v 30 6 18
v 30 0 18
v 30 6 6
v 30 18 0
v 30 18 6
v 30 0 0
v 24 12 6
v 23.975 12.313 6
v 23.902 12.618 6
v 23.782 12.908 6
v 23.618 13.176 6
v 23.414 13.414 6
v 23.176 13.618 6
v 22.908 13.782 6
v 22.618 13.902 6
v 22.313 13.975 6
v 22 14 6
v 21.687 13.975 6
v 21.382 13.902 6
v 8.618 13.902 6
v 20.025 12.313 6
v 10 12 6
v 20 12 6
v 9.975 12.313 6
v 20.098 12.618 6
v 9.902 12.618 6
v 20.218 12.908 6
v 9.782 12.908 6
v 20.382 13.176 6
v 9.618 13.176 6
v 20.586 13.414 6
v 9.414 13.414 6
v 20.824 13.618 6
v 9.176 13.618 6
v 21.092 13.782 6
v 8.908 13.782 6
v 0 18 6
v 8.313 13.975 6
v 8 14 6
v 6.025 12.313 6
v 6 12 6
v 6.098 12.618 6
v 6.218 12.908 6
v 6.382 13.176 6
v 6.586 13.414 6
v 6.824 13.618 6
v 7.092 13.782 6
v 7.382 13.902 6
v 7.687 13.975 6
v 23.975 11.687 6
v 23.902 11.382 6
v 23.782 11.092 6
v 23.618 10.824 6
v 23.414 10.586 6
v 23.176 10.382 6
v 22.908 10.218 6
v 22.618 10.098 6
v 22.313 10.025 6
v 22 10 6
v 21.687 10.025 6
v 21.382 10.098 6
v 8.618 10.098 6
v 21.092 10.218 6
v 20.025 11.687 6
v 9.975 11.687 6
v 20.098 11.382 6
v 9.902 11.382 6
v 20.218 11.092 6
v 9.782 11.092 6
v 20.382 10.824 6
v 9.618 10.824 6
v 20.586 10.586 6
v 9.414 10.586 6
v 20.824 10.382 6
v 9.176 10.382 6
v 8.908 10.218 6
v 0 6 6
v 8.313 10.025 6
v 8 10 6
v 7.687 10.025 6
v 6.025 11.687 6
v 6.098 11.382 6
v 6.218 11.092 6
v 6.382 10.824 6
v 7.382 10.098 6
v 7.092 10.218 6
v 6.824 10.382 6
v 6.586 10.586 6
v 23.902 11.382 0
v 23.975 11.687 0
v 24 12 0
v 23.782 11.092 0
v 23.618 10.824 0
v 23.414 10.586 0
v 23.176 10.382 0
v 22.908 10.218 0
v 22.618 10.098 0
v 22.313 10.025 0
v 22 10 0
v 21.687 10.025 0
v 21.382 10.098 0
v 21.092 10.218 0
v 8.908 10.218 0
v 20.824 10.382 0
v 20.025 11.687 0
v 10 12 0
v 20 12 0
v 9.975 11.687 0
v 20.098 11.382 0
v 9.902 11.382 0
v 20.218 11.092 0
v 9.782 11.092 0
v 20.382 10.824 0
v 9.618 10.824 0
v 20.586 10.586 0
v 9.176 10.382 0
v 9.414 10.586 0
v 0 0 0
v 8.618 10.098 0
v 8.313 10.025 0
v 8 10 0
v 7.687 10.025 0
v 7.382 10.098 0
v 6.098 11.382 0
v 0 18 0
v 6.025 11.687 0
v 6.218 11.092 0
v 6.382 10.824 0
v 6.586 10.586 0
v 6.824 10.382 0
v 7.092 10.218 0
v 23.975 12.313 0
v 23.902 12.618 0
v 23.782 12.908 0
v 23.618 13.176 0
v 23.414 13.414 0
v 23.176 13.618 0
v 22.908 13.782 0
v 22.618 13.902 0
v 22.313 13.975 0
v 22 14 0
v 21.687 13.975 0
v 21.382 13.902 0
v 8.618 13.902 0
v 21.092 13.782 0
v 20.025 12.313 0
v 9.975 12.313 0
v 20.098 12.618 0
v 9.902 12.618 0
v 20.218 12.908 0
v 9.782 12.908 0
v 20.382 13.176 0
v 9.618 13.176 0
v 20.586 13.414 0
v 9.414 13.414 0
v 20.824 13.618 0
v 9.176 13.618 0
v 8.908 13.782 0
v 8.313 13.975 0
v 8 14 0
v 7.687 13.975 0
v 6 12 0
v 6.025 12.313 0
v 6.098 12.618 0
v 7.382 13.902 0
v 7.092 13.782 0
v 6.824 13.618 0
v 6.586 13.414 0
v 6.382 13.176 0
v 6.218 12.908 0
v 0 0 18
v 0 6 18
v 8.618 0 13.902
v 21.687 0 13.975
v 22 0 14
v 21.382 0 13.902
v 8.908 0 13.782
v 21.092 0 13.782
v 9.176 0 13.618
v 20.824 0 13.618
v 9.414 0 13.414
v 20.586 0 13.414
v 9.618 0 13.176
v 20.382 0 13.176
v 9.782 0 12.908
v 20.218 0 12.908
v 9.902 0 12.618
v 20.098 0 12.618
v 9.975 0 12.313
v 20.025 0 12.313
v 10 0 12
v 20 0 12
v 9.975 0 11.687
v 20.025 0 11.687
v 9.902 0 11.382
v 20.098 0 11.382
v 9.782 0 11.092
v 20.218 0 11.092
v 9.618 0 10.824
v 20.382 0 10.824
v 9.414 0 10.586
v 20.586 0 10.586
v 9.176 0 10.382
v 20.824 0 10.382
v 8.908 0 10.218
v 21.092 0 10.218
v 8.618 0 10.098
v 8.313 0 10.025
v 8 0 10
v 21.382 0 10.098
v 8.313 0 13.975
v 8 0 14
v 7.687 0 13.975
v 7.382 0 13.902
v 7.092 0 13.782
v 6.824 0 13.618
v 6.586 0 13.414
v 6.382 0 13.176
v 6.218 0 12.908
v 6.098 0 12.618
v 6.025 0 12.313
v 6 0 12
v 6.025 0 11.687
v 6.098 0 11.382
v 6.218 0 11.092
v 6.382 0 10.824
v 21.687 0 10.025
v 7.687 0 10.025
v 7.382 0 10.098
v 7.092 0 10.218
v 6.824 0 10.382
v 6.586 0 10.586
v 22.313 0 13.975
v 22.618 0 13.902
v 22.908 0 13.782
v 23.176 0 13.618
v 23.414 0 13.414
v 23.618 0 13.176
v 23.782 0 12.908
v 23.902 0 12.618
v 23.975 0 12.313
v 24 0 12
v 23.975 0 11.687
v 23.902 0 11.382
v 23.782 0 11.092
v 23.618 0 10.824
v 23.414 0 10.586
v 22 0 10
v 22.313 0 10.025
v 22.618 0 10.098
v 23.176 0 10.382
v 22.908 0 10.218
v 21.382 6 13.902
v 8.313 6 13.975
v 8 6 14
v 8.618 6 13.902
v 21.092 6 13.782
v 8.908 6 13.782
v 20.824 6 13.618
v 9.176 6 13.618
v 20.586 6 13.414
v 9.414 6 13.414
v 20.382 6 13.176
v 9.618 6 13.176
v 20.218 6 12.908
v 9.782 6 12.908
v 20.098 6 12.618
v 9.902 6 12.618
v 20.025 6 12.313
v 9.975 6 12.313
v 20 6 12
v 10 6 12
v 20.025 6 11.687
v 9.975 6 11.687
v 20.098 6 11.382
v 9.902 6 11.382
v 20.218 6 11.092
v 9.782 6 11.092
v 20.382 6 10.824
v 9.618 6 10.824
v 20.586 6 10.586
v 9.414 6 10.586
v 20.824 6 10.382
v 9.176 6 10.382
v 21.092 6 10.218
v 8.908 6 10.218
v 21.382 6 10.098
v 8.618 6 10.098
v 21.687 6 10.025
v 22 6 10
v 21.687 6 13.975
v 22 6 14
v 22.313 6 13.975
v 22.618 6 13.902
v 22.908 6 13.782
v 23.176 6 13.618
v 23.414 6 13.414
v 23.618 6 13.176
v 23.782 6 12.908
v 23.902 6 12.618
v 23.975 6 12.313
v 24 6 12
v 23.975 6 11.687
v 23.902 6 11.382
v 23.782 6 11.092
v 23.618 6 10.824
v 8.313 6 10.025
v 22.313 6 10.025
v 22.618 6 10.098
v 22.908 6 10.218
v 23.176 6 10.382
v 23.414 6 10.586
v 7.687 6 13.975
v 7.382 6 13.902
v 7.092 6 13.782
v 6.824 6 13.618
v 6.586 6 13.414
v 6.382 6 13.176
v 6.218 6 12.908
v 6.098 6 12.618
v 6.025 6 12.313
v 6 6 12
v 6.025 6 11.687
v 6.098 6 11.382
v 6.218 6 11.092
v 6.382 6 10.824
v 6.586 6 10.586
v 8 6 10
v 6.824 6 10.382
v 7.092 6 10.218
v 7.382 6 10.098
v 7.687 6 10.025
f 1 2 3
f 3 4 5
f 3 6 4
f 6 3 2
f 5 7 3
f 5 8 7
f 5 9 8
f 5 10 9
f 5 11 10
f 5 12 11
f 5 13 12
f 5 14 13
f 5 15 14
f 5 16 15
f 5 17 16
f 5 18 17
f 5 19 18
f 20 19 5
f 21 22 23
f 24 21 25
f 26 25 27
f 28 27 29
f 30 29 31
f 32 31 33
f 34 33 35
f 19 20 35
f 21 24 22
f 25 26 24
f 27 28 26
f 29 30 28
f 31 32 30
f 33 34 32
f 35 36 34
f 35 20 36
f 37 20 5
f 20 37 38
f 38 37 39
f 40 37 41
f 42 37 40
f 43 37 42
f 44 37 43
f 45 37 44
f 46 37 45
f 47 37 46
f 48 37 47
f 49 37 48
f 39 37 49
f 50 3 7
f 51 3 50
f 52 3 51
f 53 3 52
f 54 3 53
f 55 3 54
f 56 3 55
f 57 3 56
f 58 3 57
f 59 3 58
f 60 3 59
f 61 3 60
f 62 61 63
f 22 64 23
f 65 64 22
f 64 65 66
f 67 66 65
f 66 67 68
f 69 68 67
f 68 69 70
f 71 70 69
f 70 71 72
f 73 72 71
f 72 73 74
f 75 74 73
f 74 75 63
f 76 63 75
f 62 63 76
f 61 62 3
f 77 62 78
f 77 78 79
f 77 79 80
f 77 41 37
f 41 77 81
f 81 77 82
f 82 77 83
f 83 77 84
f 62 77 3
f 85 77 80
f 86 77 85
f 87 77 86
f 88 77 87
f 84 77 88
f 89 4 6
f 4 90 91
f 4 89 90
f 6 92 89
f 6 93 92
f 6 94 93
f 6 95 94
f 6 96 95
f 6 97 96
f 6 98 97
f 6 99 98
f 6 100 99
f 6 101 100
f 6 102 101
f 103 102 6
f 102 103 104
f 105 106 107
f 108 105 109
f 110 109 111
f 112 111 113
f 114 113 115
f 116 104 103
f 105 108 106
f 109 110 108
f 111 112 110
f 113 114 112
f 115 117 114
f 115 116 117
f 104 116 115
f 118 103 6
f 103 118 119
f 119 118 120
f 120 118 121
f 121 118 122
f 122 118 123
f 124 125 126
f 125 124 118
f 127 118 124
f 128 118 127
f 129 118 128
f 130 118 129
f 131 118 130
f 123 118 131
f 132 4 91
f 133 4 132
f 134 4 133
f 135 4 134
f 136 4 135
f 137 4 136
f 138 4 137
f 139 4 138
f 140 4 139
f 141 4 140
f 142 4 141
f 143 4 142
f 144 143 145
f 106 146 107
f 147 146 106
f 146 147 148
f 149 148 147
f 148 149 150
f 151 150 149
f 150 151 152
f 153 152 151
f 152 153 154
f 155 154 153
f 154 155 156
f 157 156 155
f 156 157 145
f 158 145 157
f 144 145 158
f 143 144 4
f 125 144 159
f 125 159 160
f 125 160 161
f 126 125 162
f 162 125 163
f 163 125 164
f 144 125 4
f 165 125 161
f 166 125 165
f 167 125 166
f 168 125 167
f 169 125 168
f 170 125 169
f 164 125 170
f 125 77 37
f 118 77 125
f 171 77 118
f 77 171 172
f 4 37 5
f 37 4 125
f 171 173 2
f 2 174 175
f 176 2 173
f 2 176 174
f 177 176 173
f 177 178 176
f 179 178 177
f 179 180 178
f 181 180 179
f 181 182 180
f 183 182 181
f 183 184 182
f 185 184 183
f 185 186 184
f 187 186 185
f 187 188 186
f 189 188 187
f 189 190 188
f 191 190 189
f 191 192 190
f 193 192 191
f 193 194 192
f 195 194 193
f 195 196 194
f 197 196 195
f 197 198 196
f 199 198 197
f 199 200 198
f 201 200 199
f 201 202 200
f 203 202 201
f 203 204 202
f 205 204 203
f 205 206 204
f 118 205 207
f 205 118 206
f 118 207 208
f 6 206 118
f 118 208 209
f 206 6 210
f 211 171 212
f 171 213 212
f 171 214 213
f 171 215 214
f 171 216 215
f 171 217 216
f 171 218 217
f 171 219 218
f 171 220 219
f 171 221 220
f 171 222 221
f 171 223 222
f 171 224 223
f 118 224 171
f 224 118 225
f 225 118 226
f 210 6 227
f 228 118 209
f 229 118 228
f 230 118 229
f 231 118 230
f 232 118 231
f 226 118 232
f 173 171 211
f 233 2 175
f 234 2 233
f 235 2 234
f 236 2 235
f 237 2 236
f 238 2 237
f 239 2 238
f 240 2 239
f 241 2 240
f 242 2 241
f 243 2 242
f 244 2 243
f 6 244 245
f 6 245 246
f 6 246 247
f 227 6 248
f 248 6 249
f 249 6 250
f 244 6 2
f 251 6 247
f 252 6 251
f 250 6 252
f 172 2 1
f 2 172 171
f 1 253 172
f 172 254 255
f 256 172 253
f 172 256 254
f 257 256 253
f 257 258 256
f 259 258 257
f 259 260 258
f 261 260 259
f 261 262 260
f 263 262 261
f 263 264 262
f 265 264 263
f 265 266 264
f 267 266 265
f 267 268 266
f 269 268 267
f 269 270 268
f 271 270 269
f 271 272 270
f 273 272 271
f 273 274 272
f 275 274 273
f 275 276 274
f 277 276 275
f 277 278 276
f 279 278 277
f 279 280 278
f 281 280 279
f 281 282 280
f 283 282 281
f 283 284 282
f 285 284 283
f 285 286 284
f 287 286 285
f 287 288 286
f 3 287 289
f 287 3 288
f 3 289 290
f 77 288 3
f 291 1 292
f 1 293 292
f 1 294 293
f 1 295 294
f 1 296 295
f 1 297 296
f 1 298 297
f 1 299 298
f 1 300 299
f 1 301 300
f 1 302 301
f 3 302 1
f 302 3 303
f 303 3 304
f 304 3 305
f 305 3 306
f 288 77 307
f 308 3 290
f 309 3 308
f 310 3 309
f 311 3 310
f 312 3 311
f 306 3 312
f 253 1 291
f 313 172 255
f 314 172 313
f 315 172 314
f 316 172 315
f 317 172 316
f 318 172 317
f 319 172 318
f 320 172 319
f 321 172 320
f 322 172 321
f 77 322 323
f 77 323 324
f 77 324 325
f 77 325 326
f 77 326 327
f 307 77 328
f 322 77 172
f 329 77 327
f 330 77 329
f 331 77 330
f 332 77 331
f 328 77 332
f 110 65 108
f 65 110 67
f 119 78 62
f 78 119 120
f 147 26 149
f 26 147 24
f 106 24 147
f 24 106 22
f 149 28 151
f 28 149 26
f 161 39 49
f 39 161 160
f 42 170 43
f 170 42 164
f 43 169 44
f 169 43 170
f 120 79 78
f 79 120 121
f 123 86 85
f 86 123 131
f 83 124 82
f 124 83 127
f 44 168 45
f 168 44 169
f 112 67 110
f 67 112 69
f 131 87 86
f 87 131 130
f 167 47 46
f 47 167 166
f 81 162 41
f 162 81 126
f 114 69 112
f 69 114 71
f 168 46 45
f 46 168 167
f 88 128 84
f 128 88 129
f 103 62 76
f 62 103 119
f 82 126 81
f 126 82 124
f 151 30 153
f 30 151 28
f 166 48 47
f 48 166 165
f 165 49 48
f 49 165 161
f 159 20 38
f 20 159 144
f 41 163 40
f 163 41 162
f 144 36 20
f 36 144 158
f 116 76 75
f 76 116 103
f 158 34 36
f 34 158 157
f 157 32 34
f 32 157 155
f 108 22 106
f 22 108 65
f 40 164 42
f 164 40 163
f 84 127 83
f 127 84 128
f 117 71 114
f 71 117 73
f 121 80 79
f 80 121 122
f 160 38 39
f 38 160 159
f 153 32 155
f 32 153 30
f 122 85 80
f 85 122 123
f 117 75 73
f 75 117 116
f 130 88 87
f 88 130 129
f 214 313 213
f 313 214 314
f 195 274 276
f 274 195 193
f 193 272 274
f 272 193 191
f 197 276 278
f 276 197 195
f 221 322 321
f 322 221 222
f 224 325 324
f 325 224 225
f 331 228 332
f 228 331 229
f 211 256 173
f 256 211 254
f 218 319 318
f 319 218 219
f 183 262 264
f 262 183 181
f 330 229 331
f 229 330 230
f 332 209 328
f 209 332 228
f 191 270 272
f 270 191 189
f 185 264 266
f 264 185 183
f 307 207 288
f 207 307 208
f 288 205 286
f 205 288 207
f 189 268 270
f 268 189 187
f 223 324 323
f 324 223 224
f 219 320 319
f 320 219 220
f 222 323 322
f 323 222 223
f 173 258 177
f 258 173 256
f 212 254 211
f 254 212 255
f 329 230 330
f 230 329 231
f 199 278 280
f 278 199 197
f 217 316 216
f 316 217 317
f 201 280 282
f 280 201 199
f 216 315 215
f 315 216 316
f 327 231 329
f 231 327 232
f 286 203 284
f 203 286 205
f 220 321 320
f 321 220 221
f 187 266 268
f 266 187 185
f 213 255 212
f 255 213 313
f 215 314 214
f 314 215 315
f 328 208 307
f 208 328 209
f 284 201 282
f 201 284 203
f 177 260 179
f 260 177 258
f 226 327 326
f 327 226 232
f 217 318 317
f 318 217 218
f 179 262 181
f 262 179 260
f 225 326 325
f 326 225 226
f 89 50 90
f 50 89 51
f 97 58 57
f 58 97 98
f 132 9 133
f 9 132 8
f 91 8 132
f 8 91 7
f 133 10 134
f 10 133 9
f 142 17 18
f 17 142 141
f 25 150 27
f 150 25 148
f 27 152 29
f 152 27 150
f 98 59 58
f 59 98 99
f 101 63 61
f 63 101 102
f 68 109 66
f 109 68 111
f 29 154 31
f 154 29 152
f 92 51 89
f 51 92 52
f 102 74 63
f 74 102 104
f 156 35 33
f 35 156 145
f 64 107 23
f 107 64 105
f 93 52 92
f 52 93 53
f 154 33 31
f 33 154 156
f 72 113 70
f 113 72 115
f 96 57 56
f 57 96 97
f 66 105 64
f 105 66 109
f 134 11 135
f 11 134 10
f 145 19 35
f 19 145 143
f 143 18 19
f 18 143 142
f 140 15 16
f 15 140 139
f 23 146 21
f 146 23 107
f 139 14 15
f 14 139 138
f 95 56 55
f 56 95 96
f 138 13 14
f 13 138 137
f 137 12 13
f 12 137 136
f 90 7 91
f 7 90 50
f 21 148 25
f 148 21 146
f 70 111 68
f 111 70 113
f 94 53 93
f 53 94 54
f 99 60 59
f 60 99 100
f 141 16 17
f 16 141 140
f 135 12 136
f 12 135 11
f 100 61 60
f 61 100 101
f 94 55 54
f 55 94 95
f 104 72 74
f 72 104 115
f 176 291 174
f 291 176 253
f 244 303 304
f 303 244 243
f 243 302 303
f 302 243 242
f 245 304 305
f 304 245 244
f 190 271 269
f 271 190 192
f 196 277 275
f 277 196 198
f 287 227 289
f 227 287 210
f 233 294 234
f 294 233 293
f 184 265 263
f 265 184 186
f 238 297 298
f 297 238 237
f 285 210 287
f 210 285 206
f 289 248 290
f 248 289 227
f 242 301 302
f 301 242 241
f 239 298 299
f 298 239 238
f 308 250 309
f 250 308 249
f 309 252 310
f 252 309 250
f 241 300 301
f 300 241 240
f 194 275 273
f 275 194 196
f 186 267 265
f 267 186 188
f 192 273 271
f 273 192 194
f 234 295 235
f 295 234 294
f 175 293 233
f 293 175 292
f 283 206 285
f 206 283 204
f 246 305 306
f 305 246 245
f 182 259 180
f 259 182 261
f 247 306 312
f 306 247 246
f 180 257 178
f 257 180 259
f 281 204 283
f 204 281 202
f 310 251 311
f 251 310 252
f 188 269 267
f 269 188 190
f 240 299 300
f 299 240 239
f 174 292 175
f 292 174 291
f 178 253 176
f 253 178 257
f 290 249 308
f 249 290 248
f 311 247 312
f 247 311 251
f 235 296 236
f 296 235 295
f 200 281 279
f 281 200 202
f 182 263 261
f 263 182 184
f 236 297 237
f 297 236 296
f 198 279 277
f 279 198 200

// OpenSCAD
// OpenReef enclosure corner bracket: joins two acrylic panels at 90 degrees.
// M3 heat-set inserts (4.0 mm hole) in both faces. Print 12 (plus 4 for shelves). PETG.
$fn = 40;
len = 30; t = 6; w = 18;
difference() {
  union() { cube([len, w, t]); cube([len, t, w]); }
  for (x = [8, len - 8]) {
    translate([x, w - 6, -1]) cylinder(d = 4.0, h = t + 2);     // insert, base face
    translate([x, -1, w - 6]) rotate([-90, 0, 0]) cylinder(d = 4.0, h = t + 2);  // insert, wall face
  }
}
